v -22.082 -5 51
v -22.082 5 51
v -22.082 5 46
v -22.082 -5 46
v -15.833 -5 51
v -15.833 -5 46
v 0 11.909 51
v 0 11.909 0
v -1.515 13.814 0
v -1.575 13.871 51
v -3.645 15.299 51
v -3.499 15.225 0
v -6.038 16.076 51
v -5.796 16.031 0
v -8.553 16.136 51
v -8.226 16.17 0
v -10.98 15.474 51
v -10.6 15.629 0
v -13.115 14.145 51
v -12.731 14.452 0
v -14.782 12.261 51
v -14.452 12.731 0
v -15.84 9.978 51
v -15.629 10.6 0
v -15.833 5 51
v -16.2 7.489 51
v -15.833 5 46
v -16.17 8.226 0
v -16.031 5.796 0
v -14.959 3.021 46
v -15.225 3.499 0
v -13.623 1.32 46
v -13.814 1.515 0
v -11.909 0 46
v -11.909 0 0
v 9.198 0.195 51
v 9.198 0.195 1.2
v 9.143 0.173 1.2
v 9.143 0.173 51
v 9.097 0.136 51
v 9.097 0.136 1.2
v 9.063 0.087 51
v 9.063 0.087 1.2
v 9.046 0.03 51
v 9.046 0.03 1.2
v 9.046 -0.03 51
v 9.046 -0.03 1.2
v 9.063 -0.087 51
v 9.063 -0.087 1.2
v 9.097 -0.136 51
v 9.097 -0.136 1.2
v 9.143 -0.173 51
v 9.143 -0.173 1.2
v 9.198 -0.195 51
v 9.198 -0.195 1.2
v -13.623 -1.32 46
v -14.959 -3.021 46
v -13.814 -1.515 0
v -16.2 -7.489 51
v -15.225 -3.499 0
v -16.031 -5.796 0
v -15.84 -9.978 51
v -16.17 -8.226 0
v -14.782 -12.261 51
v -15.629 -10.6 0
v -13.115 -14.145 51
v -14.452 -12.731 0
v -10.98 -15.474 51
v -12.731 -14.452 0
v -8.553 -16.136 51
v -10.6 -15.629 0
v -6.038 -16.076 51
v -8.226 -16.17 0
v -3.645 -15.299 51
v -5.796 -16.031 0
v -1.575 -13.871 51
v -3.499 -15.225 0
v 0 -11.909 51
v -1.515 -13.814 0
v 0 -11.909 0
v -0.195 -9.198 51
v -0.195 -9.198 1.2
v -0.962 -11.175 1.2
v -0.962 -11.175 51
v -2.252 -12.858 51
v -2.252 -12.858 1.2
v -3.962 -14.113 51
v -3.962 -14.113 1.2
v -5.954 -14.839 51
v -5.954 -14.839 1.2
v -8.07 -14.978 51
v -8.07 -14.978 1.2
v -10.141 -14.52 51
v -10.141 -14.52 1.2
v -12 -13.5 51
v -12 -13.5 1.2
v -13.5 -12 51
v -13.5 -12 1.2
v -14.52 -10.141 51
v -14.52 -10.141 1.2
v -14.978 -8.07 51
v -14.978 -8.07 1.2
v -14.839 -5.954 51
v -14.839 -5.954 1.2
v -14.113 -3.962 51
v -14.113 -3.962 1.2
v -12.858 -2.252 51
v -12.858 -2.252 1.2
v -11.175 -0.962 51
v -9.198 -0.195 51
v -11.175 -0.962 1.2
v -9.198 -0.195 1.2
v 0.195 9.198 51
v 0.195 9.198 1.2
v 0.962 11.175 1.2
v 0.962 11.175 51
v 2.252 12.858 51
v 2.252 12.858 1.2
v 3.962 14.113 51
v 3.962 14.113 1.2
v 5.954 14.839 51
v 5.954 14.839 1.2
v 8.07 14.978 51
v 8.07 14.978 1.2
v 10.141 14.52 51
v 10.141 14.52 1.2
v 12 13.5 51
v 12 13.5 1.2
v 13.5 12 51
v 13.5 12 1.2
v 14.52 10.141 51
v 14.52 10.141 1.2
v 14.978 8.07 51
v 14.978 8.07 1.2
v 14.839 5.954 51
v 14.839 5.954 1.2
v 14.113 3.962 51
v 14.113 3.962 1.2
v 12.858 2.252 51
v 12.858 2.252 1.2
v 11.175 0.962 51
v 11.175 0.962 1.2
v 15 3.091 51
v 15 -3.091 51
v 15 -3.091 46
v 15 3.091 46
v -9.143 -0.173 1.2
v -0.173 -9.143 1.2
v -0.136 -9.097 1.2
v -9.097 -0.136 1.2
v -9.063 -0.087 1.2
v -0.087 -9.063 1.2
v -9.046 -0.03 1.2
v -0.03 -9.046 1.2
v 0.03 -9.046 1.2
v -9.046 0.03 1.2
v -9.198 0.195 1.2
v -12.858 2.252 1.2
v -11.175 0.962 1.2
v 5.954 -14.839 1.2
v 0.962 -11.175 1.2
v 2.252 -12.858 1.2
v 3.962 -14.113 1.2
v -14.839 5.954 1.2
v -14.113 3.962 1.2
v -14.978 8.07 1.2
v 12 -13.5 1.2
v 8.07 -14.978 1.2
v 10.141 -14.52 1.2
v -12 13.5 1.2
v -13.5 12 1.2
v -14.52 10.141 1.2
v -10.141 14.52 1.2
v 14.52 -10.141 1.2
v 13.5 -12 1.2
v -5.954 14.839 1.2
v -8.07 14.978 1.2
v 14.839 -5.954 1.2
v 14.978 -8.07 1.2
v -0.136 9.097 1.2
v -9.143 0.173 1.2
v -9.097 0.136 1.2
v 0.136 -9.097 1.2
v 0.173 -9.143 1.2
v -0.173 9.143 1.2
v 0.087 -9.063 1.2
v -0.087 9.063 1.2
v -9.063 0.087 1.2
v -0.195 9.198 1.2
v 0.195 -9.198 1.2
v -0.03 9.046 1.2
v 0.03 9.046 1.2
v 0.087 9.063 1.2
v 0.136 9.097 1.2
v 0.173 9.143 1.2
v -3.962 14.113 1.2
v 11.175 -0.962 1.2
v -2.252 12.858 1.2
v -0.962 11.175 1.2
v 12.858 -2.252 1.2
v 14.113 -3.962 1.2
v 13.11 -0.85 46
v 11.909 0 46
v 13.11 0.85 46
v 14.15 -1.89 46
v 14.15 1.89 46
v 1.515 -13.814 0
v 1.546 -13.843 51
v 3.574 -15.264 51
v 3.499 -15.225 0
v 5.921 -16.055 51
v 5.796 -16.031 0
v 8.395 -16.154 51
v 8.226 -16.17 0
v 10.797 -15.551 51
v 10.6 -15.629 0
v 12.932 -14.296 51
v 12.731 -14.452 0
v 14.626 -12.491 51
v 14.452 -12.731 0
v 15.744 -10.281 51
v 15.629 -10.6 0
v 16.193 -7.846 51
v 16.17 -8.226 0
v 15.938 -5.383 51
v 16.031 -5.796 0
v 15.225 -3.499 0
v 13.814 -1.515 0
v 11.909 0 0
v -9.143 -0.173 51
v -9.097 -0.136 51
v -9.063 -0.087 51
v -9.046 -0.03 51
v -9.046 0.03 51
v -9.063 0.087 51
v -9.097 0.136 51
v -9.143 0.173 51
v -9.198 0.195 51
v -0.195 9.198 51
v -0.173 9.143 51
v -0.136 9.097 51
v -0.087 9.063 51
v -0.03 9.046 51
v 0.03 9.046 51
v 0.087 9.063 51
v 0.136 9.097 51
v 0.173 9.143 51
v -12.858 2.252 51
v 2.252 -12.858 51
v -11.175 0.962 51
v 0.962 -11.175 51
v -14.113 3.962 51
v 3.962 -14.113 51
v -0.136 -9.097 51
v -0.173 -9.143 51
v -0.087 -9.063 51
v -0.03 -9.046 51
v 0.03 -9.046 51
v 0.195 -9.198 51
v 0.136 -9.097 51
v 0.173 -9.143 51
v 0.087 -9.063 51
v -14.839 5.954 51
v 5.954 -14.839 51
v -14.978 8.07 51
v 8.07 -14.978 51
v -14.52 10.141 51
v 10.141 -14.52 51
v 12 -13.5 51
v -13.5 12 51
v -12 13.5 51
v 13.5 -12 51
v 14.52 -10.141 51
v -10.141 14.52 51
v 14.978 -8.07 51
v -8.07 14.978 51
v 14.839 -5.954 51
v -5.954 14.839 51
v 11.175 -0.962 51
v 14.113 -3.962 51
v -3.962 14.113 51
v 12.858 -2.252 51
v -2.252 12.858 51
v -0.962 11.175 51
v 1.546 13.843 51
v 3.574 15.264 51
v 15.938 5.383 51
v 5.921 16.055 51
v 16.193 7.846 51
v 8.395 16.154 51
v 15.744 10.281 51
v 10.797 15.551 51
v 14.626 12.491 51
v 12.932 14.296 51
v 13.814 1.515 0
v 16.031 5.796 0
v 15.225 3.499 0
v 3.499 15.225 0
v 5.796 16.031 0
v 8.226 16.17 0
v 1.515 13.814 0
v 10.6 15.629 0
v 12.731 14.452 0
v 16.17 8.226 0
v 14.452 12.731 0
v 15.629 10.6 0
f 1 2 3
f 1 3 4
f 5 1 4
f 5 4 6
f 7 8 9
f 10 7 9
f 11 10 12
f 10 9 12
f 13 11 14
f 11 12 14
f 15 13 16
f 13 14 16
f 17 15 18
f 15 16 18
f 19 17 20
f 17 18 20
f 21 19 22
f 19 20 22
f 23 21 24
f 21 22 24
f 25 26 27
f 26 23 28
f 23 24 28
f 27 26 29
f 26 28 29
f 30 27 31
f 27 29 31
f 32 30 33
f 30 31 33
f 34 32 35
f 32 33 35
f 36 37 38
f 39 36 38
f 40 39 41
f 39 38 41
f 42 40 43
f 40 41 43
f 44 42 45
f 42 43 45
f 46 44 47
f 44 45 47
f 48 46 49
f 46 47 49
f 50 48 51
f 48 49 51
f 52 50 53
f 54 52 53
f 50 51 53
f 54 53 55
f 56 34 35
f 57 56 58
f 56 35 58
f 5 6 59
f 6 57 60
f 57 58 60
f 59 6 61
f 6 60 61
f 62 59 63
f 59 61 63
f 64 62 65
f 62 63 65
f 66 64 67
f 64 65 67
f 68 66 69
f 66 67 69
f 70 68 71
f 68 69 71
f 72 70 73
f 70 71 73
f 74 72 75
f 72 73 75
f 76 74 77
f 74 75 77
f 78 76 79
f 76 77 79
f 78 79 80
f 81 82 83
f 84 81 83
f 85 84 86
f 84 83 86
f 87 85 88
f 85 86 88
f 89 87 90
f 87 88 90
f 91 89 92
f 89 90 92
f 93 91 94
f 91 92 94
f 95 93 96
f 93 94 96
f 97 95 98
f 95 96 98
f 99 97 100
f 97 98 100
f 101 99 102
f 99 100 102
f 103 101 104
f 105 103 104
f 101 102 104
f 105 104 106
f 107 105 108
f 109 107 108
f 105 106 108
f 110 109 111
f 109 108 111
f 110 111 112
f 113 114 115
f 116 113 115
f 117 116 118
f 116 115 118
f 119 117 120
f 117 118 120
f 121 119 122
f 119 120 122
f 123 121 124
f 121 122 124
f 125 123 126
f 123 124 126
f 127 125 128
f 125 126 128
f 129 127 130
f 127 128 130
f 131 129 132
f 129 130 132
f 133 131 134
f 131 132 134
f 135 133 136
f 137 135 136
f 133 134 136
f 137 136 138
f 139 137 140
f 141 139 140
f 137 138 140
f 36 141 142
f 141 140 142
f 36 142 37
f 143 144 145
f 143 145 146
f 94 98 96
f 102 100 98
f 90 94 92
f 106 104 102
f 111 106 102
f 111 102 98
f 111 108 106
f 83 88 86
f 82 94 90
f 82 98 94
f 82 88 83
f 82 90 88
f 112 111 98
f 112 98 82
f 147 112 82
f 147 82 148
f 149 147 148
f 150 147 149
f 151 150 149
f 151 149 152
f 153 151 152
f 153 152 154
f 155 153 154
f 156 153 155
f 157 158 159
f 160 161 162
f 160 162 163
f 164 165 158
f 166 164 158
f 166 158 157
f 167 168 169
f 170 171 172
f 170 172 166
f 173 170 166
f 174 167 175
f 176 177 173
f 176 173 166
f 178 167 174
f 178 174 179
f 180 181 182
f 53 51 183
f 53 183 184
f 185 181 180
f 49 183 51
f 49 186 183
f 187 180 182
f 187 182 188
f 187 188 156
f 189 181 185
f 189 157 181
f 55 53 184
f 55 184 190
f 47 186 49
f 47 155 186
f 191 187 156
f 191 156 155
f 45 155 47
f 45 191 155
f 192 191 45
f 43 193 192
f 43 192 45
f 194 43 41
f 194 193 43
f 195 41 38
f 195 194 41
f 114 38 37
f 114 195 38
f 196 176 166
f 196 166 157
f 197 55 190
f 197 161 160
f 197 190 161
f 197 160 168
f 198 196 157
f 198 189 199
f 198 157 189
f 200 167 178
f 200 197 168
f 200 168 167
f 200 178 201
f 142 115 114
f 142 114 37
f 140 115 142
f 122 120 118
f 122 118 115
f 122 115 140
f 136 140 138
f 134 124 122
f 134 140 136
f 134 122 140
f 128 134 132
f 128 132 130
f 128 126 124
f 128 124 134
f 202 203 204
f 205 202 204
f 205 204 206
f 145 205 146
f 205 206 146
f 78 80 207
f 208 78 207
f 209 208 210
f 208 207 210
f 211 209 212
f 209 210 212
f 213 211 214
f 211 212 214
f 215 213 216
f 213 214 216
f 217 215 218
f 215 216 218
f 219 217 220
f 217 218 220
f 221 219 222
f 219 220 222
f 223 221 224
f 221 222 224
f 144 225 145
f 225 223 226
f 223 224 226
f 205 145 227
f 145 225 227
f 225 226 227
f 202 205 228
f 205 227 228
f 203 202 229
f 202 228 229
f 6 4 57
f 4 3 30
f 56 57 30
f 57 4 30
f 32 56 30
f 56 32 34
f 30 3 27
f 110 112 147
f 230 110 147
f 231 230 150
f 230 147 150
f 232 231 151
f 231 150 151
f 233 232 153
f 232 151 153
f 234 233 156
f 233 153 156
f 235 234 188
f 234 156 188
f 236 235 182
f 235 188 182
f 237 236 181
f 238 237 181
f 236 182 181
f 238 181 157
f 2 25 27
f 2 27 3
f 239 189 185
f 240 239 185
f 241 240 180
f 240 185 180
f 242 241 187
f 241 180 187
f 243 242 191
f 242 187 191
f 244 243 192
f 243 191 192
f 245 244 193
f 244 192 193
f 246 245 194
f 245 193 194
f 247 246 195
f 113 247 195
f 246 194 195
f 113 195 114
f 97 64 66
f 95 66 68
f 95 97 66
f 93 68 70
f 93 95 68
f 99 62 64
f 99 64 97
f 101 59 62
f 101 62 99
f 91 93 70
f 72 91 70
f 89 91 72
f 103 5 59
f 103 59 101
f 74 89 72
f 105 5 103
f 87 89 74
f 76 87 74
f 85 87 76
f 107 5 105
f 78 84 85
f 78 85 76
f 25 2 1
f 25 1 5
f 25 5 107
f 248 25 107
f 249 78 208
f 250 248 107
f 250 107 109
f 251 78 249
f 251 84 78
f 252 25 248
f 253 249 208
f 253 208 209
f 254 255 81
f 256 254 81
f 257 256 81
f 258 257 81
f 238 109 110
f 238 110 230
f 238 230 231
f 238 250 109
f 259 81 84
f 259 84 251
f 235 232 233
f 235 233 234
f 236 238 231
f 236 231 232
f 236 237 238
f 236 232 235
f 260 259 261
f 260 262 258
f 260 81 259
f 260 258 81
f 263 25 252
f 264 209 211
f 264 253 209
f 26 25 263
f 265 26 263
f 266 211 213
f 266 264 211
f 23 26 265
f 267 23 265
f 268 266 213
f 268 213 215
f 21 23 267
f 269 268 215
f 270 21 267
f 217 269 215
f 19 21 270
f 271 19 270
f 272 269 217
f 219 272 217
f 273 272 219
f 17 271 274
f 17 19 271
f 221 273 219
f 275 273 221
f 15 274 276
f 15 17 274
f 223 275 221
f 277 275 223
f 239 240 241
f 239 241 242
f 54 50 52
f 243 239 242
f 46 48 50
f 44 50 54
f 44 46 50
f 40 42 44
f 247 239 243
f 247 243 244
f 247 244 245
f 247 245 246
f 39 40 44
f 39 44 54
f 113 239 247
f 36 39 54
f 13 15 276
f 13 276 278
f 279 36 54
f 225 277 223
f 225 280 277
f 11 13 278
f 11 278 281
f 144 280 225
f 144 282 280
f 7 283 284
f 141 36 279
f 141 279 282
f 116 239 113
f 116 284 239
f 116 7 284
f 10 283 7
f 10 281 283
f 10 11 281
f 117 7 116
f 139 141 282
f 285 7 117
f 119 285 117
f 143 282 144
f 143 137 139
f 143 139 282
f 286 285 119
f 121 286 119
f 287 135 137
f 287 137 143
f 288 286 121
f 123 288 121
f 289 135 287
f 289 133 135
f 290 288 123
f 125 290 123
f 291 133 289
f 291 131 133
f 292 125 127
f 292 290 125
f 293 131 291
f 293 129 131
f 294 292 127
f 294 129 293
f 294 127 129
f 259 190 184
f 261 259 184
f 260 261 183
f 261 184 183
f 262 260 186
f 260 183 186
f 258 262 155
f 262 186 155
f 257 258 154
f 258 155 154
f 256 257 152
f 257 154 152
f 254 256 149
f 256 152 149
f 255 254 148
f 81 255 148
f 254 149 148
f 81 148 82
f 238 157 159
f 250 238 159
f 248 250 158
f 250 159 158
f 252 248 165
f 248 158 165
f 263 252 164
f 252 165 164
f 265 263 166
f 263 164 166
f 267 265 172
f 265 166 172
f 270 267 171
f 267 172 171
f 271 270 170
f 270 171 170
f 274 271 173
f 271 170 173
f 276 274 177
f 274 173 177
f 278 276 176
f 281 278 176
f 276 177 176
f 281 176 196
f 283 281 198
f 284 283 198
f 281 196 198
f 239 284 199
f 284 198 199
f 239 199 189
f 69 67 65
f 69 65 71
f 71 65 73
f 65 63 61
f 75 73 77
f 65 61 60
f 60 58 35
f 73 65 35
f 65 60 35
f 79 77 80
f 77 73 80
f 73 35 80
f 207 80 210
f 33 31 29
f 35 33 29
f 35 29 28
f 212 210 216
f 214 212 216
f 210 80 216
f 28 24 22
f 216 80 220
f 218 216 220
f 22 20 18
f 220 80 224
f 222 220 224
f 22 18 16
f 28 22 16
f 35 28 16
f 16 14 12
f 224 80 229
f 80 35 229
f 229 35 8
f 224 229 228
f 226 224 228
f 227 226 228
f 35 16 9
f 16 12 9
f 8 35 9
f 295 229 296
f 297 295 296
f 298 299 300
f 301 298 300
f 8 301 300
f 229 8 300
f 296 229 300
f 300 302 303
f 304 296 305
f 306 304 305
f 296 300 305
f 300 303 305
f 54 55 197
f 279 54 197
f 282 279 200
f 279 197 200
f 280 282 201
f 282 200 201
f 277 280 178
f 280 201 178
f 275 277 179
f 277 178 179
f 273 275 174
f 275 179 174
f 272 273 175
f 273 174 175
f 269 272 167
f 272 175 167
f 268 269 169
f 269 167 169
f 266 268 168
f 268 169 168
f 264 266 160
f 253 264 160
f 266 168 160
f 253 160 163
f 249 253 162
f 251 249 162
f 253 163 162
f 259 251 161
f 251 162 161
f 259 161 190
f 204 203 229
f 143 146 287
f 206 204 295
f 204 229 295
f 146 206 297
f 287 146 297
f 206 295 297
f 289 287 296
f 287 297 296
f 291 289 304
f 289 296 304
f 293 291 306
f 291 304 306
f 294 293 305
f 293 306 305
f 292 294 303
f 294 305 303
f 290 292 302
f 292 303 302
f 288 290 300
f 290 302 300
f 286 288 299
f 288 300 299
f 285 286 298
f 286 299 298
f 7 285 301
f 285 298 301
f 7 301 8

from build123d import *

# Parameters (mm, degrees)
F2_DEPTH = 51
F3_DEPTH = 1.2
F5_DEPTH = 5
F6_DEPTH = 5


with BuildPart() as f2:
    # F1 (on Top) → F2 (new body)
    with BuildSketch(Plane.XY):
        with BuildLine():
            ThreePointArc((11.909081537, 0), (13.6518289963, 13.6518289963), (0, 11.909081537))
            ThreePointArc((0, 11.909081537), (-13.6518289963, 13.6518289963), (-11.909081537, 0))
            ThreePointArc((-11.909081537, 0), (-13.6518289963, -13.6518289963), (0, -11.909081537))
            ThreePointArc((0, -11.909081537), (13.6518289963, -13.6518289963), (11.909081537, 0))
        make_face()
        with BuildLine():
            ThreePointArc((0.1948051948, 9.1982723157), (12.8033008589, 12.8033008589), (9.1982723157, 0.1948051948))
            ThreePointArc((9.1982723157, 0.1948051948), (9.0435595774, 0), (9.1982723157, -0.1948051948))
            ThreePointArc((9.1982723157, -0.1948051948), (12.8033008589, -12.8033008589), (0.1948051948, -9.1982723157))
            ThreePointArc((0.1948051948, -9.1982723157), (0, -9.0435595774), (-0.1948051948, -9.1982723157))
            ThreePointArc((-0.1948051948, -9.1982723157), (-12.8033008589, -12.8033008589), (-9.1982723157, -0.1948051948))
            ThreePointArc((-9.1982723157, -0.1948051948), (-9.0435595774, 0), (-9.1982723157, 0.1948051948))
            ThreePointArc((-9.1982723157, 0.1948051948), (-12.8033008589, 12.8033008589), (-0.1948051948, 9.1982723157))
            ThreePointArc((-0.1948051948, 9.1982723157), (0, 9.0435595774), (0.1948051948, 9.1982723157))
        make_face(mode=Mode.SUBTRACT)
    extrude(amount=F2_DEPTH)

    # F1 (on Top) → F3 (join)
    with BuildSketch(Plane.XY):
        with BuildLine():
            ThreePointArc((9.1982723157, -0.1948051948), (9.0435595774, 0), (9.1982723157, 0.1948051948))
            ThreePointArc((9.1982723157, 0.1948051948), (12.8033008589, 12.8033008589), (0.1948051948, 9.1982723157))
            ThreePointArc((0.1948051948, 9.1982723157), (0, 9.0435595774), (-0.1948051948, 9.1982723157))
            ThreePointArc((-0.1948051948, 9.1982723157), (-12.8033008589, 12.8033008589), (-9.1982723157, 0.1948051948))
            ThreePointArc((-9.1982723157, 0.1948051948), (-9.0435595774, 0), (-9.1982723157, -0.1948051948))
            ThreePointArc((-9.1982723157, -0.1948051948), (-12.8033008589, -12.8033008589), (-0.1948051948, -9.1982723157))
            ThreePointArc((-0.1948051948, -9.1982723157), (0, -9.0435595774), (0.1948051948, -9.1982723157))
            ThreePointArc((0.1948051948, -9.1982723157), (12.8033008589, -12.8033008589), (9.1982723157, -0.1948051948))
        make_face()
    extrude(amount=F3_DEPTH)

    # F4 (on face) → F5 (join)
    with BuildSketch(Plane.XY.offset(51)):
        with BuildLine():
            ThreePointArc((-11.909081537, 0), (-14.3440182045, 2.1288348735), (-15.8330666624, 5))
            Line((-15.8330666624, 5), (-22.0820734114, 5))
            Line((-22.0820734114, 5), (-22.0820734114, -5))
            Line((-22.0820734114, -5), (-15.8330666624, -5))
            ThreePointArc((-15.8330666624, -5), (-14.3440182045, -2.1288348735), (-11.909081537, 0))
        make_face()
    extrude(amount=-F5_DEPTH)

    # F4 (on face) → F6 (join)
    with BuildSketch(Plane.XY.offset(51)):
        with BuildLine():
            Line((15, -3.090918463), (15, 3.090918463))
            ThreePointArc((15, 3.090918463), (13.6518289963, 1.3481710037), (11.909081537, 0))
            ThreePointArc((11.909081537, 0), (13.6518289963, -1.3481710037), (15, -3.090918463))
        make_face()
    extrude(amount=-F6_DEPTH)


solid = f2.part
